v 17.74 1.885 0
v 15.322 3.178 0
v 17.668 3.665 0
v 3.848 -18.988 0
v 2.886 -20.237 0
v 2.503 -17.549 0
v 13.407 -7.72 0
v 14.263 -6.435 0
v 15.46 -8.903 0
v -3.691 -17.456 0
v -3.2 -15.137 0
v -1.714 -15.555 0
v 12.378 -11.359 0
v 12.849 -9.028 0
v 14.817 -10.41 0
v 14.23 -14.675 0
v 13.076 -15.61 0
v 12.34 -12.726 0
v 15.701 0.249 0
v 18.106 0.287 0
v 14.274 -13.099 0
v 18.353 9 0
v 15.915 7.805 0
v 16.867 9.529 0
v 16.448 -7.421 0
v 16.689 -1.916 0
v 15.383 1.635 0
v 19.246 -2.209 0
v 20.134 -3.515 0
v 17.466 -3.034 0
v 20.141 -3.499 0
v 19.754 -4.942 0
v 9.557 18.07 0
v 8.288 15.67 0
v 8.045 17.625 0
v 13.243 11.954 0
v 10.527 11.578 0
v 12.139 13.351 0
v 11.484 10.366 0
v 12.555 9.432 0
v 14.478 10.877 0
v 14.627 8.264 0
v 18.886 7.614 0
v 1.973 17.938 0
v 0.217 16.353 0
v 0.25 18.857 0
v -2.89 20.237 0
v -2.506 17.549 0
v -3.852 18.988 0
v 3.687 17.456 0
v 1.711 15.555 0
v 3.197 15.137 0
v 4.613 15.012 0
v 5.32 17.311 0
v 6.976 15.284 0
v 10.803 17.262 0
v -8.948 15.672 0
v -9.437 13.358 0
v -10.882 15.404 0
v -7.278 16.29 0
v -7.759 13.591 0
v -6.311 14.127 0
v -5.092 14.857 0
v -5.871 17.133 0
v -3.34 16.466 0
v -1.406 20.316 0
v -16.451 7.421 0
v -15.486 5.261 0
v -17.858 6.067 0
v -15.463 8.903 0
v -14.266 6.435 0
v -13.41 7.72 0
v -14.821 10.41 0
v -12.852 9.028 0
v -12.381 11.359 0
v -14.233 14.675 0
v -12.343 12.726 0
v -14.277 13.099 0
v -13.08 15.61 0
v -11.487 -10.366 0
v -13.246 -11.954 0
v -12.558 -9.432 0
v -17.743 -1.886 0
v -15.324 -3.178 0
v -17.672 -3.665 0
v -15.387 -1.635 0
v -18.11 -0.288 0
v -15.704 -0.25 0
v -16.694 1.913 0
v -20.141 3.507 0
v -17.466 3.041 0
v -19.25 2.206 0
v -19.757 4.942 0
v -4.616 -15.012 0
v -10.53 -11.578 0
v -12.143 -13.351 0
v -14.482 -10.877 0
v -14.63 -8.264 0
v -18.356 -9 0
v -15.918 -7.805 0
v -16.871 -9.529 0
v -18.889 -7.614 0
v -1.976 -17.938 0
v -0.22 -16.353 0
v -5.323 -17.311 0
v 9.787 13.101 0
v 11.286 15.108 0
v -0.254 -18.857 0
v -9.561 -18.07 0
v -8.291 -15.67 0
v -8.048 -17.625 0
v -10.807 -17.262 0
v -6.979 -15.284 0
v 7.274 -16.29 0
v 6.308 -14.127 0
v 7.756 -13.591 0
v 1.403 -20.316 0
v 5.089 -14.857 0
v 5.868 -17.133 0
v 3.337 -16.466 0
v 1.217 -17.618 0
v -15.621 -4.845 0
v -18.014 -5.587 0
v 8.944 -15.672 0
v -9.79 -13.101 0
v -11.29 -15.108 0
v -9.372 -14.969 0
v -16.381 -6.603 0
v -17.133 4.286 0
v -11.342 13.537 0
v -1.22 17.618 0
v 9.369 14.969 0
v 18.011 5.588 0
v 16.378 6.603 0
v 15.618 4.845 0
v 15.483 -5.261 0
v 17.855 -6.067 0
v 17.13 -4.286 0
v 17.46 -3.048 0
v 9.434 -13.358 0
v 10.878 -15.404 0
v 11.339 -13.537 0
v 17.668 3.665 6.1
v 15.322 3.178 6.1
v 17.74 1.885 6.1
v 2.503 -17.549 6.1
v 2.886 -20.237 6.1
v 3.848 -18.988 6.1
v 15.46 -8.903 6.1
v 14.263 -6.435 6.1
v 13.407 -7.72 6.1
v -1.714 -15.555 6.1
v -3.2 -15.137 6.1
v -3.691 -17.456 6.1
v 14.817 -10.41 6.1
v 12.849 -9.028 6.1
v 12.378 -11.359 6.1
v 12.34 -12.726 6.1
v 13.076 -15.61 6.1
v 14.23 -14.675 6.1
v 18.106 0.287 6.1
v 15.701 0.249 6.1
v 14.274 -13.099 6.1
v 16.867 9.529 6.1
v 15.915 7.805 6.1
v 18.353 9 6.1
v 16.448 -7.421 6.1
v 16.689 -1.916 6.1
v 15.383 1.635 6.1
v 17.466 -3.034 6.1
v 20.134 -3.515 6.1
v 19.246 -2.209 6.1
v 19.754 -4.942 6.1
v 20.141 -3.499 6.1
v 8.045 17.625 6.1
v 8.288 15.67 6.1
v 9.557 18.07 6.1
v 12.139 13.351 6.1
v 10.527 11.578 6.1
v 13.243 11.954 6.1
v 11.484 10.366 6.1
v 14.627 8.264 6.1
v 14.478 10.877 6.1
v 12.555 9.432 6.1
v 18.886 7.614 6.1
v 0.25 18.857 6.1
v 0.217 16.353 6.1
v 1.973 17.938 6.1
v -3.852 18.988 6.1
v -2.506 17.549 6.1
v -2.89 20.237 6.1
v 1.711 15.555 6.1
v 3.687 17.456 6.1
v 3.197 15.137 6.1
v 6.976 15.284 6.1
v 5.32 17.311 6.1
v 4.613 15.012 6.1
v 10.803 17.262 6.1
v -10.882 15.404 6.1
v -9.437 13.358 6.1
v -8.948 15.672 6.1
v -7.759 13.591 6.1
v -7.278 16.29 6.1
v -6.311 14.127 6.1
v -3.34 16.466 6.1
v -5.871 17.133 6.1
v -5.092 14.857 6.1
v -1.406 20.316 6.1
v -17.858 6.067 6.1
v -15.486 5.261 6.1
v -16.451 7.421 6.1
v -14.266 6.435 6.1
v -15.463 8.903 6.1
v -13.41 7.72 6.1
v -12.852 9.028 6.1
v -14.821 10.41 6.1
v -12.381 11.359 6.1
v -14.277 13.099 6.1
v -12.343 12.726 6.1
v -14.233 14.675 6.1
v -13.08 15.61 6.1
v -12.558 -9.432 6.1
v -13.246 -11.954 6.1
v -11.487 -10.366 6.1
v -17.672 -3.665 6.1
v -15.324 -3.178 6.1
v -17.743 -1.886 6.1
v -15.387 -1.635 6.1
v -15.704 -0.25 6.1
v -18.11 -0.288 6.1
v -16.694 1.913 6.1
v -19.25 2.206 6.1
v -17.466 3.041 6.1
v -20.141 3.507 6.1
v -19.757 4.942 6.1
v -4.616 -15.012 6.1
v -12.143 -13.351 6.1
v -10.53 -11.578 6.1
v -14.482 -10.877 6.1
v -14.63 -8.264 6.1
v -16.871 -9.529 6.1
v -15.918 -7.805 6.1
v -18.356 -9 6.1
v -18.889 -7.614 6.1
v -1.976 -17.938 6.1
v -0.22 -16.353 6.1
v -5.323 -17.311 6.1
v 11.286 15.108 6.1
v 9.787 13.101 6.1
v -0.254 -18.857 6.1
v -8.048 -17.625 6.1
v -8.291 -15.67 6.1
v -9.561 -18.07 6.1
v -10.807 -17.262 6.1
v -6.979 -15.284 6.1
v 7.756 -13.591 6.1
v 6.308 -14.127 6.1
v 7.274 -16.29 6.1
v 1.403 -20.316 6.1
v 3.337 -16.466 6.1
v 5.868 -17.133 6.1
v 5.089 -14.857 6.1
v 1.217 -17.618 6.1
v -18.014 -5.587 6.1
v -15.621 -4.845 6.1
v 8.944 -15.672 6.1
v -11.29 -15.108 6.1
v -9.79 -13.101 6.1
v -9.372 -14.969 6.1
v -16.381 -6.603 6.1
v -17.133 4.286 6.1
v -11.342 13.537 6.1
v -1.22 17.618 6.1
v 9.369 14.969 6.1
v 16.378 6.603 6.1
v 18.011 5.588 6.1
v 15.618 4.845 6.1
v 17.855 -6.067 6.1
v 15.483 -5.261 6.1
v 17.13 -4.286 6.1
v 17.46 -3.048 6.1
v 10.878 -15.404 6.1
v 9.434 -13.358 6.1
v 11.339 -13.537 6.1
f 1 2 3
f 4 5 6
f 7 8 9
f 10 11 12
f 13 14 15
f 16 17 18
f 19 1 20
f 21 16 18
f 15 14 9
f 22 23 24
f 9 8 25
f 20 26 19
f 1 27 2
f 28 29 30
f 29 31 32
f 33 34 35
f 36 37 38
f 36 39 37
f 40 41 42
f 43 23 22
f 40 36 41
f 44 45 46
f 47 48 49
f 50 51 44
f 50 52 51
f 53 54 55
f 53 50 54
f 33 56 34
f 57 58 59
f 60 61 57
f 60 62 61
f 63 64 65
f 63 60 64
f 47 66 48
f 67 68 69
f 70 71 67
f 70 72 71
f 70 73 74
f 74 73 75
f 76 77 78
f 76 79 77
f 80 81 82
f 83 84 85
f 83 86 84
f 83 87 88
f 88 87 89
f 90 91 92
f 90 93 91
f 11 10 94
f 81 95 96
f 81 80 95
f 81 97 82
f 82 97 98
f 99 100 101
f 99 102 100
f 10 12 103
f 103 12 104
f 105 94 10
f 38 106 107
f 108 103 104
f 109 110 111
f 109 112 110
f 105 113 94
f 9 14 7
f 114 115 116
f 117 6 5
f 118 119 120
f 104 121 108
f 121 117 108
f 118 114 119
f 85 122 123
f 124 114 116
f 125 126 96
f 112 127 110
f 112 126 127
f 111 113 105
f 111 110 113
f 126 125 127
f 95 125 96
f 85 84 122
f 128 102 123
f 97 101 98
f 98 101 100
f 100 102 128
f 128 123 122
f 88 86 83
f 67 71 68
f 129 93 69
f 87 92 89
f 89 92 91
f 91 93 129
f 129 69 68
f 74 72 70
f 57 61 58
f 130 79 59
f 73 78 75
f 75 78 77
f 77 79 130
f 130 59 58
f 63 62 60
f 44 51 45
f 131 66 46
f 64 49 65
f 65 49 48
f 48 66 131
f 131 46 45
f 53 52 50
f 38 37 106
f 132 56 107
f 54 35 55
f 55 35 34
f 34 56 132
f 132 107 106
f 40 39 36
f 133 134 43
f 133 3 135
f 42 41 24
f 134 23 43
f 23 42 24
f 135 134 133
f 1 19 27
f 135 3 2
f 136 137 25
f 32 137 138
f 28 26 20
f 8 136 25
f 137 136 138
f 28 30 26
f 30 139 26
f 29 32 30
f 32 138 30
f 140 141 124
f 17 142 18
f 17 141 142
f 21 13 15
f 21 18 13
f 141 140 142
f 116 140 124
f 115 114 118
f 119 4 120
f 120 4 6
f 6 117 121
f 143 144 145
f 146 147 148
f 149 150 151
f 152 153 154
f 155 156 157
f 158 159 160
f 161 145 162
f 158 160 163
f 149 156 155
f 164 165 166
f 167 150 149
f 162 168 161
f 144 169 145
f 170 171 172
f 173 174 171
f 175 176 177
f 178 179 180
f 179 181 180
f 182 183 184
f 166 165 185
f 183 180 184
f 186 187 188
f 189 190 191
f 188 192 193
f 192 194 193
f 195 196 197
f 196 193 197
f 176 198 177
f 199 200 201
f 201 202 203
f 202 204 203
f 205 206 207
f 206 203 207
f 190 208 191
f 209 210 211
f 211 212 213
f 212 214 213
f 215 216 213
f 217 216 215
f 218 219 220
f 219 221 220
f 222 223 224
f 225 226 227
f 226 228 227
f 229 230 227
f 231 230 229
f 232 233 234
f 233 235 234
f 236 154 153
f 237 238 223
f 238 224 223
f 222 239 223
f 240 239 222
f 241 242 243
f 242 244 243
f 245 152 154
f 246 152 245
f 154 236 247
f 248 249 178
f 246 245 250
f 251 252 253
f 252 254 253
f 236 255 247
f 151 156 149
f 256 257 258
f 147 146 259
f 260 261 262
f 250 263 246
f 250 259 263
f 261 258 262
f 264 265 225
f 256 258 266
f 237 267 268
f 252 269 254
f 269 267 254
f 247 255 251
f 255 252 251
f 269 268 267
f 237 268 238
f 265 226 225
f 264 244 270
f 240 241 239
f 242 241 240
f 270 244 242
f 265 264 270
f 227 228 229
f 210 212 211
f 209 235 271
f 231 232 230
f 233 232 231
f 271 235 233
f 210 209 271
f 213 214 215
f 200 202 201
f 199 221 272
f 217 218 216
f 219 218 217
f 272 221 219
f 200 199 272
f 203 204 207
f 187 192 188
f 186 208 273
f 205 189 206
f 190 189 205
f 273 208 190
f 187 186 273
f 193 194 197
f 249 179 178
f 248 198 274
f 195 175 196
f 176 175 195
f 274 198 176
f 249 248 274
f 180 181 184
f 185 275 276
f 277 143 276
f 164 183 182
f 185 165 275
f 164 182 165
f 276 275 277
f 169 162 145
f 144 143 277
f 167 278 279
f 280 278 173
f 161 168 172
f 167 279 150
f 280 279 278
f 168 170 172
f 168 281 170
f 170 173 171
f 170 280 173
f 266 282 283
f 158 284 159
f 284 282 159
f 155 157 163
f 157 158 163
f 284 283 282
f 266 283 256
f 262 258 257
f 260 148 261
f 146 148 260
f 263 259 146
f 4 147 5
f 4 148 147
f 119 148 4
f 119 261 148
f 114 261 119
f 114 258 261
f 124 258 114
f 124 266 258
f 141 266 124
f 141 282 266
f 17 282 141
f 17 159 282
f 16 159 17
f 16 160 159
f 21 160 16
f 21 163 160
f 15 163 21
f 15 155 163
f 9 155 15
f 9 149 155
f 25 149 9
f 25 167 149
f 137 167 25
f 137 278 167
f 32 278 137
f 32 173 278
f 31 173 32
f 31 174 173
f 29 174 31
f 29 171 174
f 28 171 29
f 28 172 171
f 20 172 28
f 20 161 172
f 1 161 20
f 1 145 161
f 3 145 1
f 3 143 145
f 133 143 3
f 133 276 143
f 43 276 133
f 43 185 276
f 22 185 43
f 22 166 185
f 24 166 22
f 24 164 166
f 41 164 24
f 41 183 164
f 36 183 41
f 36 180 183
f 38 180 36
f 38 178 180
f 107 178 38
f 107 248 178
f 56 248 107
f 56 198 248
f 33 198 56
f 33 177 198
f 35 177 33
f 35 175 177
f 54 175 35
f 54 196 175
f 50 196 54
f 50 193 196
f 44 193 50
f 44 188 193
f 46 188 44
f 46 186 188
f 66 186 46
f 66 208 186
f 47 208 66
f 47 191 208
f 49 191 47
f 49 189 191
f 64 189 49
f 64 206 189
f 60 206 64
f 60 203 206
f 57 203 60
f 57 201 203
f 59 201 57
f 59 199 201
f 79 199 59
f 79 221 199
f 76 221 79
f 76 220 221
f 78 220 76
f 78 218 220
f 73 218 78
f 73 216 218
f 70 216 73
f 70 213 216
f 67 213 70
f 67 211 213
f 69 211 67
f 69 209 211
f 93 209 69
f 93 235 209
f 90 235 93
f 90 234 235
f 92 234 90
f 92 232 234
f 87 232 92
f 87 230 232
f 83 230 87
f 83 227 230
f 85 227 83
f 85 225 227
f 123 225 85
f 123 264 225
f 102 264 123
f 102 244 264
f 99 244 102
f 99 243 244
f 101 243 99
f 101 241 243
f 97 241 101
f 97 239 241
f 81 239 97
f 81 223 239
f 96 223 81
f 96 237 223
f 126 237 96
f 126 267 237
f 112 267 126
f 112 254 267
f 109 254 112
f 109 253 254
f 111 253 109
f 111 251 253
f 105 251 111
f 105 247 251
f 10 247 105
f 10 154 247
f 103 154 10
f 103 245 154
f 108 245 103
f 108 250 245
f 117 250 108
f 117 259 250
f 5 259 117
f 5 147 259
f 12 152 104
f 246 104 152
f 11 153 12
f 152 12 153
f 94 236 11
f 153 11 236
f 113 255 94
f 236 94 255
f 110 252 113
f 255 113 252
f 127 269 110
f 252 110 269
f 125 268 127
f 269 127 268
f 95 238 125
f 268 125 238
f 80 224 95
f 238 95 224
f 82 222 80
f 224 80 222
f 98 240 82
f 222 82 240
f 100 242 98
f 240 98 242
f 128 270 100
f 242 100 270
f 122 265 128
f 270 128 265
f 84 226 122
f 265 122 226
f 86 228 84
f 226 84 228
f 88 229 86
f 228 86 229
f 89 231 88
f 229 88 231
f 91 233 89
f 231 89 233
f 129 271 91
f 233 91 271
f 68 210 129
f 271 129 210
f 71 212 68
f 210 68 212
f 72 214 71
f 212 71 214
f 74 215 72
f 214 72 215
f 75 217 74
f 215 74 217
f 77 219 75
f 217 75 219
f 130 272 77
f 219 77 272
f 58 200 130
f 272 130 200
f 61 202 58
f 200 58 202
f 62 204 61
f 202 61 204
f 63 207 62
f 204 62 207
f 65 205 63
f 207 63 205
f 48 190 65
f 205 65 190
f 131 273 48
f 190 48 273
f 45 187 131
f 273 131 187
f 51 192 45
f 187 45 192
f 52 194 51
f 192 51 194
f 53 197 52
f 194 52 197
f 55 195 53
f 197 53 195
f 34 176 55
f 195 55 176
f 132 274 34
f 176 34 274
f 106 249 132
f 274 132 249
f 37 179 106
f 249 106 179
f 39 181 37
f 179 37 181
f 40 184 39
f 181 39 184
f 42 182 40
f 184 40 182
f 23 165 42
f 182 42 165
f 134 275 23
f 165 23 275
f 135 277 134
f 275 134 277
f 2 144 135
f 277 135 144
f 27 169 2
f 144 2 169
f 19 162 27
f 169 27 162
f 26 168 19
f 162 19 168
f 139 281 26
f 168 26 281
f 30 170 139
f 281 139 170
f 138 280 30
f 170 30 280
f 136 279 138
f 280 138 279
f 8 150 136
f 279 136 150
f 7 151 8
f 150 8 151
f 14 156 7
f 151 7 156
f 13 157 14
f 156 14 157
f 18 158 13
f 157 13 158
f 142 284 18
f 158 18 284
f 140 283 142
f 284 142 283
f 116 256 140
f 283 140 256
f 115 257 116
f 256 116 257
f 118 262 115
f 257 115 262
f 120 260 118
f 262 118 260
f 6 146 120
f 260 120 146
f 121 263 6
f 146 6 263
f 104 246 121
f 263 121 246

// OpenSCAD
width_lock = 0.750000000;

thickness = 2.75;
tolerance = 0.15;
height = 6.1;

center_lock_1 = [765.762441146,610.914145729];
size_lock_1 = [34.631762292,34.933122708];
stroke_width_lock_1 = 0.065400989;
// paths for lock_1
points_lock_1_1 = [ [-16.239926562,-6.545937187],[-15.487242945,-4.803716399],[-15.192888870,-3.151026270],[-15.254439274,-1.621254529],[-15.569469089,-0.247788906],[-16.550266689,1.896673066],[-17.315881146,3.015257813],[-16.986263229,4.248983438],[-15.353284713,5.216057225],[-14.143727484,6.380096354],[-13.294352300,7.653886304],[-12.741919922,8.950212552],[-12.274926618,11.261615859],[-12.236833646,12.616590104],[-11.245016562,13.420923438],[-9.355474430,13.243464502],[-7.692714115,13.474233672],[-6.256837314,14.005501709],[-5.047945729,14.729539375],[-3.311525000,16.325006641],[-2.484265521,17.398801563],[-1.209079687,17.466561354],[0.215279314,16.212352070],[1.696120140,15.421703018],[3.170038597,15.007520288],[4.573630495,14.882709974],[6.916217842,15.152830954],[8.216648646,15.535314688],[9.288105312,14.840598229],[9.703234547,12.988701913],[10.436531338,11.478634964],[11.385507987,10.277204681],[12.447676797,9.351218359],[14.501640107,8.192806794],[15.778519687,7.737858646],[16.237016146,6.546043021],[15.484335525,4.803808693],[15.189947861,3.151023789],[15.251393982,1.620994803],[15.566214714,0.247028229],[16.546143324,-1.899491706],[17.310060313,-3.022084062],[17.315881146,-3.008325729],[16.983352812,-4.248983437],[15.350373160,-5.216057225],[14.140812933,-6.380096354],[13.291433512,-7.653886304],[12.738996276,-8.950212552],[12.271993877,-11.261615859],[12.233896771,-12.616590104],[11.242079687,-13.420923437],[9.352545203,-13.243464502],[7.689788815,-13.474233672],[6.253913462,-14.005501709],[5.045022083,-14.729539375],[3.308603008,-16.325006641],[2.481355104,-17.398801562],[1.206169271,-17.466561354],[-0.218189731,-16.212352070],[-1.699030557,-15.421703018],[-3.172949014,-15.007520288],[-4.576540911,-14.882709974],[-6.919128258,-15.152830954],[-8.219559063,-15.535314687],[-9.291042188,-14.840598229],[-9.706162740,-12.988701913],[-10.439453330,-11.478634964],[-11.388426259,-10.277204681],[-12.450593828,-9.351218359],[-14.504562100,-8.192806794],[-15.781456563,-7.737858646],[-16.239926562,-6.545937187] ];
points_lock_1_2 = [ [9.288131771,14.840598229],[9.703255631,12.988687598],[10.436569372,11.478520449],[11.385605139,10.276818193],[12.447895078,9.350302240],[14.502366058,8.189714889],[15.780239479,7.730529688],[14.502366058,8.189714889],[12.447895078,9.350302240],[11.385605139,10.276818193],[10.436569372,11.478520449],[9.703255631,12.988687598],[9.288131771,14.840598229],[8.210960104,15.540235938],[9.288131771,14.840598229] ];

module polygon_lock_1() {
 render(convexity=4) {
    difference() {
      polygon(points=points_lock_1_1);
      polygon(points=points_lock_1_2);
    }
 }
}

w = size_lock_1[0];
linear_extrude(height=height)
difference() {
    scale((w+tolerance+thickness*2)/w) polygon_lock_1();
    scale((w+tolerance*2)/w) polygon_lock_1();
}
